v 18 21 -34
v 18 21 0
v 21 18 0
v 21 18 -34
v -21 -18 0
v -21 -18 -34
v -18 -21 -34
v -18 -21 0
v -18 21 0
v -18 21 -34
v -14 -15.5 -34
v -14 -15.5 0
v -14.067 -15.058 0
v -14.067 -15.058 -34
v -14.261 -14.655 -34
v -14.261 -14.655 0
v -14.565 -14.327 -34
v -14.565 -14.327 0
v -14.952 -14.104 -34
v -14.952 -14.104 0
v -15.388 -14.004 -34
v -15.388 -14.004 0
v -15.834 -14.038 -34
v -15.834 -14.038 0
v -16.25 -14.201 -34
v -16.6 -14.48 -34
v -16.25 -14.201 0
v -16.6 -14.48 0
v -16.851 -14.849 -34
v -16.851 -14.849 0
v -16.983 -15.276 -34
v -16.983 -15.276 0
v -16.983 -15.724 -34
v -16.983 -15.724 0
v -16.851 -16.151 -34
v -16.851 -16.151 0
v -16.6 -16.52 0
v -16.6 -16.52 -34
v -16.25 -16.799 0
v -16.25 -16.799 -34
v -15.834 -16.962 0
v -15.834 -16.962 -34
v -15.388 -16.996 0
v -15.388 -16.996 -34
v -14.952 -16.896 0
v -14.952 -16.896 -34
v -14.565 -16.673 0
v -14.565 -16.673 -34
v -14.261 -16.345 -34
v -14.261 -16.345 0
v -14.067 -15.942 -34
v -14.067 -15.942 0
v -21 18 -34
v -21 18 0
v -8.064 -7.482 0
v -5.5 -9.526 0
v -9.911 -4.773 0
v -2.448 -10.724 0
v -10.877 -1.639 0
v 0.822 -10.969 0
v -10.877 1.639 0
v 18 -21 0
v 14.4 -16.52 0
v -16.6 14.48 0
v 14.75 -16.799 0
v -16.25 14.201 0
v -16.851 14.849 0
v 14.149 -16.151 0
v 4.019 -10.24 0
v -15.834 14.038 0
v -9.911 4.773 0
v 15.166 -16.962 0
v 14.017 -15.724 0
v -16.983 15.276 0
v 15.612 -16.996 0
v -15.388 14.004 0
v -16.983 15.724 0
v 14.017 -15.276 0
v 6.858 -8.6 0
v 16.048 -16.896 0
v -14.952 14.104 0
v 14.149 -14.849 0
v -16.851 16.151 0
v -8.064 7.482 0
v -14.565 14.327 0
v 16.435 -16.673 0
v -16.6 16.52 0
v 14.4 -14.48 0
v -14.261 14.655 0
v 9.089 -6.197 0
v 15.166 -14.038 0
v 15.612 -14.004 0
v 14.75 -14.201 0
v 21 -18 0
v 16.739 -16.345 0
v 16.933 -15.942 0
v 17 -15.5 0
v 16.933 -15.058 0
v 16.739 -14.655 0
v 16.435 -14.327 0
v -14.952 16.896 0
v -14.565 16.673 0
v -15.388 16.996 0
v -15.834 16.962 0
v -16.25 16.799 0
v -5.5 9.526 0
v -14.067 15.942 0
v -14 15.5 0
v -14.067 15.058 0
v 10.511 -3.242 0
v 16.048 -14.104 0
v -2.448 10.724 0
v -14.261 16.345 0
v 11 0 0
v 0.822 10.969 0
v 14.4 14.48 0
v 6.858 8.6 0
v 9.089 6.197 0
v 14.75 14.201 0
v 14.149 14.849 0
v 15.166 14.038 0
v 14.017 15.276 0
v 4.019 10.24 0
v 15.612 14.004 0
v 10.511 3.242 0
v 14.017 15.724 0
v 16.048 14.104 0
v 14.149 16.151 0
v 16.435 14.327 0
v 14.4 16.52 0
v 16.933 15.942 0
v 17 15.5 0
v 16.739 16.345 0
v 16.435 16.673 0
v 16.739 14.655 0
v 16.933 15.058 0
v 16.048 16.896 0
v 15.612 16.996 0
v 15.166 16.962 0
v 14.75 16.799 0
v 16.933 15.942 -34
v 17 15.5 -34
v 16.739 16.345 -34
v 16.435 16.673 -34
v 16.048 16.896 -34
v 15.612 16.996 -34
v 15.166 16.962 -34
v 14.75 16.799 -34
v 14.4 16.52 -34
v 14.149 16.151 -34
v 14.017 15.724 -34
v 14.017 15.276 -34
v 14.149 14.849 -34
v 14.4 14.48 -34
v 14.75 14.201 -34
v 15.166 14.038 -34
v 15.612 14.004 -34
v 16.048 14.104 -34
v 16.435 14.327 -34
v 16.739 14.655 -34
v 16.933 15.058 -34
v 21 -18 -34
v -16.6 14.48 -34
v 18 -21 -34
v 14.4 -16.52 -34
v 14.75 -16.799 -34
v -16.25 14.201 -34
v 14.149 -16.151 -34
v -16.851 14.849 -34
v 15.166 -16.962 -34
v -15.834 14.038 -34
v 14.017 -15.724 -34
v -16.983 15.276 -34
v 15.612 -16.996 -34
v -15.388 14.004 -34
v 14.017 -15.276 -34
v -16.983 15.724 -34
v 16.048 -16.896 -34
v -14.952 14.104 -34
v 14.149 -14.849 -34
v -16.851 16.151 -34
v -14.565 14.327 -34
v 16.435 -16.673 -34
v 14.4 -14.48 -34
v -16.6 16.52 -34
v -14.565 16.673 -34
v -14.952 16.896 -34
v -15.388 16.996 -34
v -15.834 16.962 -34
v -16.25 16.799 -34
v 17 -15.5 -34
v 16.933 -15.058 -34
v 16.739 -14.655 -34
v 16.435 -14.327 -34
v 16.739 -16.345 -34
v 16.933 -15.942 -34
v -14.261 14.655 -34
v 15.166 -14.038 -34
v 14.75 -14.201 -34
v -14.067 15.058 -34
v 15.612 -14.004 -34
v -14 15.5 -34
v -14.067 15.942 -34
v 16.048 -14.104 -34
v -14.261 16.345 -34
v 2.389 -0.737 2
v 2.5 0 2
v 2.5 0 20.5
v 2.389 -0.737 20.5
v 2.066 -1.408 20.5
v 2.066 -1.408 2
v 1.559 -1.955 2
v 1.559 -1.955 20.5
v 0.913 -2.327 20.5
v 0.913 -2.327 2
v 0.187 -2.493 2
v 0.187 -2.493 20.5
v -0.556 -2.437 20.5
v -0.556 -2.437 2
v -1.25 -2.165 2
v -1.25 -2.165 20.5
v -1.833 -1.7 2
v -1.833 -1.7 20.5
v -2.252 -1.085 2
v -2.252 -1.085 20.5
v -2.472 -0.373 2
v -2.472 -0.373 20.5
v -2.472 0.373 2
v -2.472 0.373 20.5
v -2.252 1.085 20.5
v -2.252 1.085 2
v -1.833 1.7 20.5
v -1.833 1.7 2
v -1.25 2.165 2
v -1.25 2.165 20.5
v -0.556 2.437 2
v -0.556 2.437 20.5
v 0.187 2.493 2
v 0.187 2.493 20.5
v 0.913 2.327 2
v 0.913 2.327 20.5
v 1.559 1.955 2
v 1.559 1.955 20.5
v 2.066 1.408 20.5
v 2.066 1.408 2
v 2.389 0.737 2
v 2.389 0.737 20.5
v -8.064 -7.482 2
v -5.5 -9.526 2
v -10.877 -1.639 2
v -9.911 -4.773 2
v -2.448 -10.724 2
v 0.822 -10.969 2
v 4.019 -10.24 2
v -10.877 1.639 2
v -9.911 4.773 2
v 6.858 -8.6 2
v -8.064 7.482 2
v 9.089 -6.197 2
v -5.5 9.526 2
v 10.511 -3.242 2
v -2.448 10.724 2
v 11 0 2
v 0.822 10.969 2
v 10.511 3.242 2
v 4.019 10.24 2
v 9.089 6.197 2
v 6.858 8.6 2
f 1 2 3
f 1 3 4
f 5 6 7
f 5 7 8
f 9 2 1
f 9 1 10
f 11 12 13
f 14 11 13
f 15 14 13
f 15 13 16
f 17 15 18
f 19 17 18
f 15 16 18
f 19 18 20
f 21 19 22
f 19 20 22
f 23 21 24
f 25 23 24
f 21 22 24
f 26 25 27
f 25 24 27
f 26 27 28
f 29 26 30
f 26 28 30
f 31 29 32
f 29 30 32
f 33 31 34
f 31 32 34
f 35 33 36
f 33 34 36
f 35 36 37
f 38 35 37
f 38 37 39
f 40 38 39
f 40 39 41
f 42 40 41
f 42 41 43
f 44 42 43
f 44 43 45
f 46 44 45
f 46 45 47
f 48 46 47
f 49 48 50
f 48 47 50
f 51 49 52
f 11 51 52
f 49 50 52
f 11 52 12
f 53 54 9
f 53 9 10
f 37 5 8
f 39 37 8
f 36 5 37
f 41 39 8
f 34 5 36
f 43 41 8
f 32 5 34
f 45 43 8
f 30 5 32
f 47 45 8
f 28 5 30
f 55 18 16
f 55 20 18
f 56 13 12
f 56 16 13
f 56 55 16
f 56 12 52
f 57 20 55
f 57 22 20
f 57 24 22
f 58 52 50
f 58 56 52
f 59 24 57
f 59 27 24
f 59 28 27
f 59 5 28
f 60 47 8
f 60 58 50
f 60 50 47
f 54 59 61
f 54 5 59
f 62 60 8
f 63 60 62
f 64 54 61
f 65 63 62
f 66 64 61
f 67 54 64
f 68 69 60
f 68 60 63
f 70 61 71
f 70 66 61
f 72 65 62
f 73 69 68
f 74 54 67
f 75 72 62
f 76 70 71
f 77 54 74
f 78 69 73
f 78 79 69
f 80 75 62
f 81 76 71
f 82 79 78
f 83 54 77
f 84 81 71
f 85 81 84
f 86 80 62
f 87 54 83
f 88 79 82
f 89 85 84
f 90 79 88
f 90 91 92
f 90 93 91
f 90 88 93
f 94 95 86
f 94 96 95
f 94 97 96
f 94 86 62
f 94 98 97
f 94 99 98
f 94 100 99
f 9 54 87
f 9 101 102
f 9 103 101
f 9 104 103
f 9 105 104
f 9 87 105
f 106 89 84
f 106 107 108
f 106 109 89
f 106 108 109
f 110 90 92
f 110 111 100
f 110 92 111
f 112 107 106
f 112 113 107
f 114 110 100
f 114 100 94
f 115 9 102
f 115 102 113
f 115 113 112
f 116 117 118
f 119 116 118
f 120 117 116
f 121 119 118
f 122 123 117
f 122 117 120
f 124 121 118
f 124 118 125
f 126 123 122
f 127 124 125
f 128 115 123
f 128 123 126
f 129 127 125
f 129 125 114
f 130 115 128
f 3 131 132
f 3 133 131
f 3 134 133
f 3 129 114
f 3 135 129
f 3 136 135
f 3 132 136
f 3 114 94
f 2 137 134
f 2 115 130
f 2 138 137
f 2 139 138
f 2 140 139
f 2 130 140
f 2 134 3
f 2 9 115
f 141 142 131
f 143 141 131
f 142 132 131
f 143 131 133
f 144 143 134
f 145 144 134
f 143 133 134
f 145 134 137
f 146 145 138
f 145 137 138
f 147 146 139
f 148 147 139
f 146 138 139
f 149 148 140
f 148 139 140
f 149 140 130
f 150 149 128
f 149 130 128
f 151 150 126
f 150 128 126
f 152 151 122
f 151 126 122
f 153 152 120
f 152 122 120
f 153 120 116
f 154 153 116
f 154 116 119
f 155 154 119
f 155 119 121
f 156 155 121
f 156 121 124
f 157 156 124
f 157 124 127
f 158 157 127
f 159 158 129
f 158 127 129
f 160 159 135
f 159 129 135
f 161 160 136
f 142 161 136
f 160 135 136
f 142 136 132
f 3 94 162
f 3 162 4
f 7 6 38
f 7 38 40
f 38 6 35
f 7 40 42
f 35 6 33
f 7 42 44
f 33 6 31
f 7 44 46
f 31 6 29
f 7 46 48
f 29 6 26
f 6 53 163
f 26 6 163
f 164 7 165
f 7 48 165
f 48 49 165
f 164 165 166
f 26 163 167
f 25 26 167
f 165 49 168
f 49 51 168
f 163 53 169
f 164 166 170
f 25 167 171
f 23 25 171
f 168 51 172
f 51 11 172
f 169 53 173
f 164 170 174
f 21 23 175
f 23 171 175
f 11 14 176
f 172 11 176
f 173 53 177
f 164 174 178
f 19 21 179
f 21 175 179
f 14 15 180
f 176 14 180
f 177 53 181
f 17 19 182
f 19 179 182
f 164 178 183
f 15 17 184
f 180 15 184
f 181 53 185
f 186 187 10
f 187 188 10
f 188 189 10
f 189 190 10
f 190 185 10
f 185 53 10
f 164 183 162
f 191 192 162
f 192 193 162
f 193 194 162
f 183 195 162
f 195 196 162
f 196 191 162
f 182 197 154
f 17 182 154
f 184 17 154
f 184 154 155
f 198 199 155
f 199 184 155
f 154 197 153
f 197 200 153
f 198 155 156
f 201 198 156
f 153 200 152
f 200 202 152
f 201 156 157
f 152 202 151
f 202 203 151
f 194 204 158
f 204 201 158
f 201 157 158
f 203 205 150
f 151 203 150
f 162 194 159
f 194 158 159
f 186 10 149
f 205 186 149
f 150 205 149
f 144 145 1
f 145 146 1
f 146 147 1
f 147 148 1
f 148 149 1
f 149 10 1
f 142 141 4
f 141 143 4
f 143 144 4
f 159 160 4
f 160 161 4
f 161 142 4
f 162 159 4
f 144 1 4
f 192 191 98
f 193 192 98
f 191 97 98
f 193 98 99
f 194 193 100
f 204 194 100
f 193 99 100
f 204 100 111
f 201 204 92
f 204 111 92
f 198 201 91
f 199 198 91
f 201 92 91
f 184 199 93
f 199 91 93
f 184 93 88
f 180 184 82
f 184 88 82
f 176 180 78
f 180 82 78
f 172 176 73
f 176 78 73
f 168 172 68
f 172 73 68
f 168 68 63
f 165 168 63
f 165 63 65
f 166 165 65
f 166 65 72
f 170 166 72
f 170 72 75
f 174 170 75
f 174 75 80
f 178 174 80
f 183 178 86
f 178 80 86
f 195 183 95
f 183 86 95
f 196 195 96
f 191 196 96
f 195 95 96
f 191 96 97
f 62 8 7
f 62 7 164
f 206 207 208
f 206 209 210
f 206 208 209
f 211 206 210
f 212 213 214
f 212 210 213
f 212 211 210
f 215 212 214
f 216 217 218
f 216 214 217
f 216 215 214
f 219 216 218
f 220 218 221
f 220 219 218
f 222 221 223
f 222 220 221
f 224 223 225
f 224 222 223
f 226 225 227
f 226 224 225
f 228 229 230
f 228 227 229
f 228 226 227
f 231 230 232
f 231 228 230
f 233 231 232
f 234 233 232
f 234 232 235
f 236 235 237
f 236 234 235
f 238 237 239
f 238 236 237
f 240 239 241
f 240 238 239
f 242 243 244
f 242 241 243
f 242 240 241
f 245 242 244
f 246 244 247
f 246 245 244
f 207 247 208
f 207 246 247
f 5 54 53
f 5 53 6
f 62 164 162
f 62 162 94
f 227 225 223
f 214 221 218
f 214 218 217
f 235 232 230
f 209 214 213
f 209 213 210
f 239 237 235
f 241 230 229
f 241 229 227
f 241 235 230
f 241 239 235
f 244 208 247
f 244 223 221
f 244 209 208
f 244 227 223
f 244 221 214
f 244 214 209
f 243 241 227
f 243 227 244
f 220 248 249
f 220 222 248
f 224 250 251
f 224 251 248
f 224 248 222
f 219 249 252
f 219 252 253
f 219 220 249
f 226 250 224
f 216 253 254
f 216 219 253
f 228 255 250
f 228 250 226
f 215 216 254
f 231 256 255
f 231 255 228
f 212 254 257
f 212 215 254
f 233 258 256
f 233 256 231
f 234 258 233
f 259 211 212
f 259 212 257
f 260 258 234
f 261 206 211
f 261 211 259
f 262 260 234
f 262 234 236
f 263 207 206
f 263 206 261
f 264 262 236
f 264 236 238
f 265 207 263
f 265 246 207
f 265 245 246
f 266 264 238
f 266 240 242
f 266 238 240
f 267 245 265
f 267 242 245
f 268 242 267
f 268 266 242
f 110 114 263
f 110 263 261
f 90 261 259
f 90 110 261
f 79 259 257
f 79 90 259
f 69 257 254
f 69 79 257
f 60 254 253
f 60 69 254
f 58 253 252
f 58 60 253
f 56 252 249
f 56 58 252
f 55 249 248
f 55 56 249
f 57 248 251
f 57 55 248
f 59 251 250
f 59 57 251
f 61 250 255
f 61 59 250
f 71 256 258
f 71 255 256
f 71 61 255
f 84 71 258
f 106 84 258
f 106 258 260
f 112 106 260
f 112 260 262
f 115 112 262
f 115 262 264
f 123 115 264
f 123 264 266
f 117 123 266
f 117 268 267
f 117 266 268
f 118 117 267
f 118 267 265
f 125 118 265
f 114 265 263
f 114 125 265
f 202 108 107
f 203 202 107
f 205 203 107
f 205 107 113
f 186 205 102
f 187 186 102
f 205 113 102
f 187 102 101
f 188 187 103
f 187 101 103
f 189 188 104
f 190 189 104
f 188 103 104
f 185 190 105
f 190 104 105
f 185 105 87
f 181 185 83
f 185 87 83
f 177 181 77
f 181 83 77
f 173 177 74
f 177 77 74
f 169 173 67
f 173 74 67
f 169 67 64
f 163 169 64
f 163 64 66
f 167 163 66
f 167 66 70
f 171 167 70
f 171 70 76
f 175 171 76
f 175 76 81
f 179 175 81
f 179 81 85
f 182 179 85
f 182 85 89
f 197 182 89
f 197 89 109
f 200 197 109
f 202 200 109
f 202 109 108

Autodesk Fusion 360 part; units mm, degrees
sketch "Sketch1" plane through (0, 0, 0) normal (0, 0, 1) x (1, 0, 0)
  line L0 (21, 21) -> (-21, 21)
  line L1 (-21, 21) -> (-21, -21)
  line L2 (-21, -21) -> (21, -21)
  line L3 (21, -21) -> (21, 21)
  line L4 (21, 21) -> (-21, -21) construction
  line L5 (-21, 21) -> (21, -21) construction
  circle A0 centre (0, 0) radius 11
  circle A1 centre (0, 0) radius 2.5
  circle A2 centre (-15.5, 15.5) radius 1.5
  circle A3 centre (15.5, 15.5) radius 1.5
  circle A4 centre (15.5, -15.5) radius 1.5
  circle A5 centre (-15.5, -15.5) radius 1.5
  line L6 (-15.5, -15.5) -> (-15.5, 15.5) construction
  line L7 (15.5, 15.5) -> (-15.5, 15.5) construction
  line L8 (15.5, -15.5) -> (15.5, 15.5) construction
  line L9 (-15.5, -15.5) -> (15.5, -15.5) construction
  dimension "d1" = 42
  dimension "d2" = 42
  dimension "d3" = 22
  dimension "d4" = 5
  dimension "d12" = 3
  dimension "d13" = 3
  dimension "d14" = 3
  dimension "d15" = 3
  dimension "d16" = 31
extrude "Extrude1" add sketch "Sketch1" against normal blind 34 contours L0 L1 L2 L3 | A0 | A1
extrude "Extrude2" add sketch "Sketch1" along normal blind 2 contours A0
extrude "Extrude3" add sketch "Sketch1" along normal blind 20.5 contours A1
chamfer "Chamfer1" distance 3 angle 45 4 edges at (21, -21, -17) (-21, -21, -17) (-21, 21, -17) (21, 21, -17)
